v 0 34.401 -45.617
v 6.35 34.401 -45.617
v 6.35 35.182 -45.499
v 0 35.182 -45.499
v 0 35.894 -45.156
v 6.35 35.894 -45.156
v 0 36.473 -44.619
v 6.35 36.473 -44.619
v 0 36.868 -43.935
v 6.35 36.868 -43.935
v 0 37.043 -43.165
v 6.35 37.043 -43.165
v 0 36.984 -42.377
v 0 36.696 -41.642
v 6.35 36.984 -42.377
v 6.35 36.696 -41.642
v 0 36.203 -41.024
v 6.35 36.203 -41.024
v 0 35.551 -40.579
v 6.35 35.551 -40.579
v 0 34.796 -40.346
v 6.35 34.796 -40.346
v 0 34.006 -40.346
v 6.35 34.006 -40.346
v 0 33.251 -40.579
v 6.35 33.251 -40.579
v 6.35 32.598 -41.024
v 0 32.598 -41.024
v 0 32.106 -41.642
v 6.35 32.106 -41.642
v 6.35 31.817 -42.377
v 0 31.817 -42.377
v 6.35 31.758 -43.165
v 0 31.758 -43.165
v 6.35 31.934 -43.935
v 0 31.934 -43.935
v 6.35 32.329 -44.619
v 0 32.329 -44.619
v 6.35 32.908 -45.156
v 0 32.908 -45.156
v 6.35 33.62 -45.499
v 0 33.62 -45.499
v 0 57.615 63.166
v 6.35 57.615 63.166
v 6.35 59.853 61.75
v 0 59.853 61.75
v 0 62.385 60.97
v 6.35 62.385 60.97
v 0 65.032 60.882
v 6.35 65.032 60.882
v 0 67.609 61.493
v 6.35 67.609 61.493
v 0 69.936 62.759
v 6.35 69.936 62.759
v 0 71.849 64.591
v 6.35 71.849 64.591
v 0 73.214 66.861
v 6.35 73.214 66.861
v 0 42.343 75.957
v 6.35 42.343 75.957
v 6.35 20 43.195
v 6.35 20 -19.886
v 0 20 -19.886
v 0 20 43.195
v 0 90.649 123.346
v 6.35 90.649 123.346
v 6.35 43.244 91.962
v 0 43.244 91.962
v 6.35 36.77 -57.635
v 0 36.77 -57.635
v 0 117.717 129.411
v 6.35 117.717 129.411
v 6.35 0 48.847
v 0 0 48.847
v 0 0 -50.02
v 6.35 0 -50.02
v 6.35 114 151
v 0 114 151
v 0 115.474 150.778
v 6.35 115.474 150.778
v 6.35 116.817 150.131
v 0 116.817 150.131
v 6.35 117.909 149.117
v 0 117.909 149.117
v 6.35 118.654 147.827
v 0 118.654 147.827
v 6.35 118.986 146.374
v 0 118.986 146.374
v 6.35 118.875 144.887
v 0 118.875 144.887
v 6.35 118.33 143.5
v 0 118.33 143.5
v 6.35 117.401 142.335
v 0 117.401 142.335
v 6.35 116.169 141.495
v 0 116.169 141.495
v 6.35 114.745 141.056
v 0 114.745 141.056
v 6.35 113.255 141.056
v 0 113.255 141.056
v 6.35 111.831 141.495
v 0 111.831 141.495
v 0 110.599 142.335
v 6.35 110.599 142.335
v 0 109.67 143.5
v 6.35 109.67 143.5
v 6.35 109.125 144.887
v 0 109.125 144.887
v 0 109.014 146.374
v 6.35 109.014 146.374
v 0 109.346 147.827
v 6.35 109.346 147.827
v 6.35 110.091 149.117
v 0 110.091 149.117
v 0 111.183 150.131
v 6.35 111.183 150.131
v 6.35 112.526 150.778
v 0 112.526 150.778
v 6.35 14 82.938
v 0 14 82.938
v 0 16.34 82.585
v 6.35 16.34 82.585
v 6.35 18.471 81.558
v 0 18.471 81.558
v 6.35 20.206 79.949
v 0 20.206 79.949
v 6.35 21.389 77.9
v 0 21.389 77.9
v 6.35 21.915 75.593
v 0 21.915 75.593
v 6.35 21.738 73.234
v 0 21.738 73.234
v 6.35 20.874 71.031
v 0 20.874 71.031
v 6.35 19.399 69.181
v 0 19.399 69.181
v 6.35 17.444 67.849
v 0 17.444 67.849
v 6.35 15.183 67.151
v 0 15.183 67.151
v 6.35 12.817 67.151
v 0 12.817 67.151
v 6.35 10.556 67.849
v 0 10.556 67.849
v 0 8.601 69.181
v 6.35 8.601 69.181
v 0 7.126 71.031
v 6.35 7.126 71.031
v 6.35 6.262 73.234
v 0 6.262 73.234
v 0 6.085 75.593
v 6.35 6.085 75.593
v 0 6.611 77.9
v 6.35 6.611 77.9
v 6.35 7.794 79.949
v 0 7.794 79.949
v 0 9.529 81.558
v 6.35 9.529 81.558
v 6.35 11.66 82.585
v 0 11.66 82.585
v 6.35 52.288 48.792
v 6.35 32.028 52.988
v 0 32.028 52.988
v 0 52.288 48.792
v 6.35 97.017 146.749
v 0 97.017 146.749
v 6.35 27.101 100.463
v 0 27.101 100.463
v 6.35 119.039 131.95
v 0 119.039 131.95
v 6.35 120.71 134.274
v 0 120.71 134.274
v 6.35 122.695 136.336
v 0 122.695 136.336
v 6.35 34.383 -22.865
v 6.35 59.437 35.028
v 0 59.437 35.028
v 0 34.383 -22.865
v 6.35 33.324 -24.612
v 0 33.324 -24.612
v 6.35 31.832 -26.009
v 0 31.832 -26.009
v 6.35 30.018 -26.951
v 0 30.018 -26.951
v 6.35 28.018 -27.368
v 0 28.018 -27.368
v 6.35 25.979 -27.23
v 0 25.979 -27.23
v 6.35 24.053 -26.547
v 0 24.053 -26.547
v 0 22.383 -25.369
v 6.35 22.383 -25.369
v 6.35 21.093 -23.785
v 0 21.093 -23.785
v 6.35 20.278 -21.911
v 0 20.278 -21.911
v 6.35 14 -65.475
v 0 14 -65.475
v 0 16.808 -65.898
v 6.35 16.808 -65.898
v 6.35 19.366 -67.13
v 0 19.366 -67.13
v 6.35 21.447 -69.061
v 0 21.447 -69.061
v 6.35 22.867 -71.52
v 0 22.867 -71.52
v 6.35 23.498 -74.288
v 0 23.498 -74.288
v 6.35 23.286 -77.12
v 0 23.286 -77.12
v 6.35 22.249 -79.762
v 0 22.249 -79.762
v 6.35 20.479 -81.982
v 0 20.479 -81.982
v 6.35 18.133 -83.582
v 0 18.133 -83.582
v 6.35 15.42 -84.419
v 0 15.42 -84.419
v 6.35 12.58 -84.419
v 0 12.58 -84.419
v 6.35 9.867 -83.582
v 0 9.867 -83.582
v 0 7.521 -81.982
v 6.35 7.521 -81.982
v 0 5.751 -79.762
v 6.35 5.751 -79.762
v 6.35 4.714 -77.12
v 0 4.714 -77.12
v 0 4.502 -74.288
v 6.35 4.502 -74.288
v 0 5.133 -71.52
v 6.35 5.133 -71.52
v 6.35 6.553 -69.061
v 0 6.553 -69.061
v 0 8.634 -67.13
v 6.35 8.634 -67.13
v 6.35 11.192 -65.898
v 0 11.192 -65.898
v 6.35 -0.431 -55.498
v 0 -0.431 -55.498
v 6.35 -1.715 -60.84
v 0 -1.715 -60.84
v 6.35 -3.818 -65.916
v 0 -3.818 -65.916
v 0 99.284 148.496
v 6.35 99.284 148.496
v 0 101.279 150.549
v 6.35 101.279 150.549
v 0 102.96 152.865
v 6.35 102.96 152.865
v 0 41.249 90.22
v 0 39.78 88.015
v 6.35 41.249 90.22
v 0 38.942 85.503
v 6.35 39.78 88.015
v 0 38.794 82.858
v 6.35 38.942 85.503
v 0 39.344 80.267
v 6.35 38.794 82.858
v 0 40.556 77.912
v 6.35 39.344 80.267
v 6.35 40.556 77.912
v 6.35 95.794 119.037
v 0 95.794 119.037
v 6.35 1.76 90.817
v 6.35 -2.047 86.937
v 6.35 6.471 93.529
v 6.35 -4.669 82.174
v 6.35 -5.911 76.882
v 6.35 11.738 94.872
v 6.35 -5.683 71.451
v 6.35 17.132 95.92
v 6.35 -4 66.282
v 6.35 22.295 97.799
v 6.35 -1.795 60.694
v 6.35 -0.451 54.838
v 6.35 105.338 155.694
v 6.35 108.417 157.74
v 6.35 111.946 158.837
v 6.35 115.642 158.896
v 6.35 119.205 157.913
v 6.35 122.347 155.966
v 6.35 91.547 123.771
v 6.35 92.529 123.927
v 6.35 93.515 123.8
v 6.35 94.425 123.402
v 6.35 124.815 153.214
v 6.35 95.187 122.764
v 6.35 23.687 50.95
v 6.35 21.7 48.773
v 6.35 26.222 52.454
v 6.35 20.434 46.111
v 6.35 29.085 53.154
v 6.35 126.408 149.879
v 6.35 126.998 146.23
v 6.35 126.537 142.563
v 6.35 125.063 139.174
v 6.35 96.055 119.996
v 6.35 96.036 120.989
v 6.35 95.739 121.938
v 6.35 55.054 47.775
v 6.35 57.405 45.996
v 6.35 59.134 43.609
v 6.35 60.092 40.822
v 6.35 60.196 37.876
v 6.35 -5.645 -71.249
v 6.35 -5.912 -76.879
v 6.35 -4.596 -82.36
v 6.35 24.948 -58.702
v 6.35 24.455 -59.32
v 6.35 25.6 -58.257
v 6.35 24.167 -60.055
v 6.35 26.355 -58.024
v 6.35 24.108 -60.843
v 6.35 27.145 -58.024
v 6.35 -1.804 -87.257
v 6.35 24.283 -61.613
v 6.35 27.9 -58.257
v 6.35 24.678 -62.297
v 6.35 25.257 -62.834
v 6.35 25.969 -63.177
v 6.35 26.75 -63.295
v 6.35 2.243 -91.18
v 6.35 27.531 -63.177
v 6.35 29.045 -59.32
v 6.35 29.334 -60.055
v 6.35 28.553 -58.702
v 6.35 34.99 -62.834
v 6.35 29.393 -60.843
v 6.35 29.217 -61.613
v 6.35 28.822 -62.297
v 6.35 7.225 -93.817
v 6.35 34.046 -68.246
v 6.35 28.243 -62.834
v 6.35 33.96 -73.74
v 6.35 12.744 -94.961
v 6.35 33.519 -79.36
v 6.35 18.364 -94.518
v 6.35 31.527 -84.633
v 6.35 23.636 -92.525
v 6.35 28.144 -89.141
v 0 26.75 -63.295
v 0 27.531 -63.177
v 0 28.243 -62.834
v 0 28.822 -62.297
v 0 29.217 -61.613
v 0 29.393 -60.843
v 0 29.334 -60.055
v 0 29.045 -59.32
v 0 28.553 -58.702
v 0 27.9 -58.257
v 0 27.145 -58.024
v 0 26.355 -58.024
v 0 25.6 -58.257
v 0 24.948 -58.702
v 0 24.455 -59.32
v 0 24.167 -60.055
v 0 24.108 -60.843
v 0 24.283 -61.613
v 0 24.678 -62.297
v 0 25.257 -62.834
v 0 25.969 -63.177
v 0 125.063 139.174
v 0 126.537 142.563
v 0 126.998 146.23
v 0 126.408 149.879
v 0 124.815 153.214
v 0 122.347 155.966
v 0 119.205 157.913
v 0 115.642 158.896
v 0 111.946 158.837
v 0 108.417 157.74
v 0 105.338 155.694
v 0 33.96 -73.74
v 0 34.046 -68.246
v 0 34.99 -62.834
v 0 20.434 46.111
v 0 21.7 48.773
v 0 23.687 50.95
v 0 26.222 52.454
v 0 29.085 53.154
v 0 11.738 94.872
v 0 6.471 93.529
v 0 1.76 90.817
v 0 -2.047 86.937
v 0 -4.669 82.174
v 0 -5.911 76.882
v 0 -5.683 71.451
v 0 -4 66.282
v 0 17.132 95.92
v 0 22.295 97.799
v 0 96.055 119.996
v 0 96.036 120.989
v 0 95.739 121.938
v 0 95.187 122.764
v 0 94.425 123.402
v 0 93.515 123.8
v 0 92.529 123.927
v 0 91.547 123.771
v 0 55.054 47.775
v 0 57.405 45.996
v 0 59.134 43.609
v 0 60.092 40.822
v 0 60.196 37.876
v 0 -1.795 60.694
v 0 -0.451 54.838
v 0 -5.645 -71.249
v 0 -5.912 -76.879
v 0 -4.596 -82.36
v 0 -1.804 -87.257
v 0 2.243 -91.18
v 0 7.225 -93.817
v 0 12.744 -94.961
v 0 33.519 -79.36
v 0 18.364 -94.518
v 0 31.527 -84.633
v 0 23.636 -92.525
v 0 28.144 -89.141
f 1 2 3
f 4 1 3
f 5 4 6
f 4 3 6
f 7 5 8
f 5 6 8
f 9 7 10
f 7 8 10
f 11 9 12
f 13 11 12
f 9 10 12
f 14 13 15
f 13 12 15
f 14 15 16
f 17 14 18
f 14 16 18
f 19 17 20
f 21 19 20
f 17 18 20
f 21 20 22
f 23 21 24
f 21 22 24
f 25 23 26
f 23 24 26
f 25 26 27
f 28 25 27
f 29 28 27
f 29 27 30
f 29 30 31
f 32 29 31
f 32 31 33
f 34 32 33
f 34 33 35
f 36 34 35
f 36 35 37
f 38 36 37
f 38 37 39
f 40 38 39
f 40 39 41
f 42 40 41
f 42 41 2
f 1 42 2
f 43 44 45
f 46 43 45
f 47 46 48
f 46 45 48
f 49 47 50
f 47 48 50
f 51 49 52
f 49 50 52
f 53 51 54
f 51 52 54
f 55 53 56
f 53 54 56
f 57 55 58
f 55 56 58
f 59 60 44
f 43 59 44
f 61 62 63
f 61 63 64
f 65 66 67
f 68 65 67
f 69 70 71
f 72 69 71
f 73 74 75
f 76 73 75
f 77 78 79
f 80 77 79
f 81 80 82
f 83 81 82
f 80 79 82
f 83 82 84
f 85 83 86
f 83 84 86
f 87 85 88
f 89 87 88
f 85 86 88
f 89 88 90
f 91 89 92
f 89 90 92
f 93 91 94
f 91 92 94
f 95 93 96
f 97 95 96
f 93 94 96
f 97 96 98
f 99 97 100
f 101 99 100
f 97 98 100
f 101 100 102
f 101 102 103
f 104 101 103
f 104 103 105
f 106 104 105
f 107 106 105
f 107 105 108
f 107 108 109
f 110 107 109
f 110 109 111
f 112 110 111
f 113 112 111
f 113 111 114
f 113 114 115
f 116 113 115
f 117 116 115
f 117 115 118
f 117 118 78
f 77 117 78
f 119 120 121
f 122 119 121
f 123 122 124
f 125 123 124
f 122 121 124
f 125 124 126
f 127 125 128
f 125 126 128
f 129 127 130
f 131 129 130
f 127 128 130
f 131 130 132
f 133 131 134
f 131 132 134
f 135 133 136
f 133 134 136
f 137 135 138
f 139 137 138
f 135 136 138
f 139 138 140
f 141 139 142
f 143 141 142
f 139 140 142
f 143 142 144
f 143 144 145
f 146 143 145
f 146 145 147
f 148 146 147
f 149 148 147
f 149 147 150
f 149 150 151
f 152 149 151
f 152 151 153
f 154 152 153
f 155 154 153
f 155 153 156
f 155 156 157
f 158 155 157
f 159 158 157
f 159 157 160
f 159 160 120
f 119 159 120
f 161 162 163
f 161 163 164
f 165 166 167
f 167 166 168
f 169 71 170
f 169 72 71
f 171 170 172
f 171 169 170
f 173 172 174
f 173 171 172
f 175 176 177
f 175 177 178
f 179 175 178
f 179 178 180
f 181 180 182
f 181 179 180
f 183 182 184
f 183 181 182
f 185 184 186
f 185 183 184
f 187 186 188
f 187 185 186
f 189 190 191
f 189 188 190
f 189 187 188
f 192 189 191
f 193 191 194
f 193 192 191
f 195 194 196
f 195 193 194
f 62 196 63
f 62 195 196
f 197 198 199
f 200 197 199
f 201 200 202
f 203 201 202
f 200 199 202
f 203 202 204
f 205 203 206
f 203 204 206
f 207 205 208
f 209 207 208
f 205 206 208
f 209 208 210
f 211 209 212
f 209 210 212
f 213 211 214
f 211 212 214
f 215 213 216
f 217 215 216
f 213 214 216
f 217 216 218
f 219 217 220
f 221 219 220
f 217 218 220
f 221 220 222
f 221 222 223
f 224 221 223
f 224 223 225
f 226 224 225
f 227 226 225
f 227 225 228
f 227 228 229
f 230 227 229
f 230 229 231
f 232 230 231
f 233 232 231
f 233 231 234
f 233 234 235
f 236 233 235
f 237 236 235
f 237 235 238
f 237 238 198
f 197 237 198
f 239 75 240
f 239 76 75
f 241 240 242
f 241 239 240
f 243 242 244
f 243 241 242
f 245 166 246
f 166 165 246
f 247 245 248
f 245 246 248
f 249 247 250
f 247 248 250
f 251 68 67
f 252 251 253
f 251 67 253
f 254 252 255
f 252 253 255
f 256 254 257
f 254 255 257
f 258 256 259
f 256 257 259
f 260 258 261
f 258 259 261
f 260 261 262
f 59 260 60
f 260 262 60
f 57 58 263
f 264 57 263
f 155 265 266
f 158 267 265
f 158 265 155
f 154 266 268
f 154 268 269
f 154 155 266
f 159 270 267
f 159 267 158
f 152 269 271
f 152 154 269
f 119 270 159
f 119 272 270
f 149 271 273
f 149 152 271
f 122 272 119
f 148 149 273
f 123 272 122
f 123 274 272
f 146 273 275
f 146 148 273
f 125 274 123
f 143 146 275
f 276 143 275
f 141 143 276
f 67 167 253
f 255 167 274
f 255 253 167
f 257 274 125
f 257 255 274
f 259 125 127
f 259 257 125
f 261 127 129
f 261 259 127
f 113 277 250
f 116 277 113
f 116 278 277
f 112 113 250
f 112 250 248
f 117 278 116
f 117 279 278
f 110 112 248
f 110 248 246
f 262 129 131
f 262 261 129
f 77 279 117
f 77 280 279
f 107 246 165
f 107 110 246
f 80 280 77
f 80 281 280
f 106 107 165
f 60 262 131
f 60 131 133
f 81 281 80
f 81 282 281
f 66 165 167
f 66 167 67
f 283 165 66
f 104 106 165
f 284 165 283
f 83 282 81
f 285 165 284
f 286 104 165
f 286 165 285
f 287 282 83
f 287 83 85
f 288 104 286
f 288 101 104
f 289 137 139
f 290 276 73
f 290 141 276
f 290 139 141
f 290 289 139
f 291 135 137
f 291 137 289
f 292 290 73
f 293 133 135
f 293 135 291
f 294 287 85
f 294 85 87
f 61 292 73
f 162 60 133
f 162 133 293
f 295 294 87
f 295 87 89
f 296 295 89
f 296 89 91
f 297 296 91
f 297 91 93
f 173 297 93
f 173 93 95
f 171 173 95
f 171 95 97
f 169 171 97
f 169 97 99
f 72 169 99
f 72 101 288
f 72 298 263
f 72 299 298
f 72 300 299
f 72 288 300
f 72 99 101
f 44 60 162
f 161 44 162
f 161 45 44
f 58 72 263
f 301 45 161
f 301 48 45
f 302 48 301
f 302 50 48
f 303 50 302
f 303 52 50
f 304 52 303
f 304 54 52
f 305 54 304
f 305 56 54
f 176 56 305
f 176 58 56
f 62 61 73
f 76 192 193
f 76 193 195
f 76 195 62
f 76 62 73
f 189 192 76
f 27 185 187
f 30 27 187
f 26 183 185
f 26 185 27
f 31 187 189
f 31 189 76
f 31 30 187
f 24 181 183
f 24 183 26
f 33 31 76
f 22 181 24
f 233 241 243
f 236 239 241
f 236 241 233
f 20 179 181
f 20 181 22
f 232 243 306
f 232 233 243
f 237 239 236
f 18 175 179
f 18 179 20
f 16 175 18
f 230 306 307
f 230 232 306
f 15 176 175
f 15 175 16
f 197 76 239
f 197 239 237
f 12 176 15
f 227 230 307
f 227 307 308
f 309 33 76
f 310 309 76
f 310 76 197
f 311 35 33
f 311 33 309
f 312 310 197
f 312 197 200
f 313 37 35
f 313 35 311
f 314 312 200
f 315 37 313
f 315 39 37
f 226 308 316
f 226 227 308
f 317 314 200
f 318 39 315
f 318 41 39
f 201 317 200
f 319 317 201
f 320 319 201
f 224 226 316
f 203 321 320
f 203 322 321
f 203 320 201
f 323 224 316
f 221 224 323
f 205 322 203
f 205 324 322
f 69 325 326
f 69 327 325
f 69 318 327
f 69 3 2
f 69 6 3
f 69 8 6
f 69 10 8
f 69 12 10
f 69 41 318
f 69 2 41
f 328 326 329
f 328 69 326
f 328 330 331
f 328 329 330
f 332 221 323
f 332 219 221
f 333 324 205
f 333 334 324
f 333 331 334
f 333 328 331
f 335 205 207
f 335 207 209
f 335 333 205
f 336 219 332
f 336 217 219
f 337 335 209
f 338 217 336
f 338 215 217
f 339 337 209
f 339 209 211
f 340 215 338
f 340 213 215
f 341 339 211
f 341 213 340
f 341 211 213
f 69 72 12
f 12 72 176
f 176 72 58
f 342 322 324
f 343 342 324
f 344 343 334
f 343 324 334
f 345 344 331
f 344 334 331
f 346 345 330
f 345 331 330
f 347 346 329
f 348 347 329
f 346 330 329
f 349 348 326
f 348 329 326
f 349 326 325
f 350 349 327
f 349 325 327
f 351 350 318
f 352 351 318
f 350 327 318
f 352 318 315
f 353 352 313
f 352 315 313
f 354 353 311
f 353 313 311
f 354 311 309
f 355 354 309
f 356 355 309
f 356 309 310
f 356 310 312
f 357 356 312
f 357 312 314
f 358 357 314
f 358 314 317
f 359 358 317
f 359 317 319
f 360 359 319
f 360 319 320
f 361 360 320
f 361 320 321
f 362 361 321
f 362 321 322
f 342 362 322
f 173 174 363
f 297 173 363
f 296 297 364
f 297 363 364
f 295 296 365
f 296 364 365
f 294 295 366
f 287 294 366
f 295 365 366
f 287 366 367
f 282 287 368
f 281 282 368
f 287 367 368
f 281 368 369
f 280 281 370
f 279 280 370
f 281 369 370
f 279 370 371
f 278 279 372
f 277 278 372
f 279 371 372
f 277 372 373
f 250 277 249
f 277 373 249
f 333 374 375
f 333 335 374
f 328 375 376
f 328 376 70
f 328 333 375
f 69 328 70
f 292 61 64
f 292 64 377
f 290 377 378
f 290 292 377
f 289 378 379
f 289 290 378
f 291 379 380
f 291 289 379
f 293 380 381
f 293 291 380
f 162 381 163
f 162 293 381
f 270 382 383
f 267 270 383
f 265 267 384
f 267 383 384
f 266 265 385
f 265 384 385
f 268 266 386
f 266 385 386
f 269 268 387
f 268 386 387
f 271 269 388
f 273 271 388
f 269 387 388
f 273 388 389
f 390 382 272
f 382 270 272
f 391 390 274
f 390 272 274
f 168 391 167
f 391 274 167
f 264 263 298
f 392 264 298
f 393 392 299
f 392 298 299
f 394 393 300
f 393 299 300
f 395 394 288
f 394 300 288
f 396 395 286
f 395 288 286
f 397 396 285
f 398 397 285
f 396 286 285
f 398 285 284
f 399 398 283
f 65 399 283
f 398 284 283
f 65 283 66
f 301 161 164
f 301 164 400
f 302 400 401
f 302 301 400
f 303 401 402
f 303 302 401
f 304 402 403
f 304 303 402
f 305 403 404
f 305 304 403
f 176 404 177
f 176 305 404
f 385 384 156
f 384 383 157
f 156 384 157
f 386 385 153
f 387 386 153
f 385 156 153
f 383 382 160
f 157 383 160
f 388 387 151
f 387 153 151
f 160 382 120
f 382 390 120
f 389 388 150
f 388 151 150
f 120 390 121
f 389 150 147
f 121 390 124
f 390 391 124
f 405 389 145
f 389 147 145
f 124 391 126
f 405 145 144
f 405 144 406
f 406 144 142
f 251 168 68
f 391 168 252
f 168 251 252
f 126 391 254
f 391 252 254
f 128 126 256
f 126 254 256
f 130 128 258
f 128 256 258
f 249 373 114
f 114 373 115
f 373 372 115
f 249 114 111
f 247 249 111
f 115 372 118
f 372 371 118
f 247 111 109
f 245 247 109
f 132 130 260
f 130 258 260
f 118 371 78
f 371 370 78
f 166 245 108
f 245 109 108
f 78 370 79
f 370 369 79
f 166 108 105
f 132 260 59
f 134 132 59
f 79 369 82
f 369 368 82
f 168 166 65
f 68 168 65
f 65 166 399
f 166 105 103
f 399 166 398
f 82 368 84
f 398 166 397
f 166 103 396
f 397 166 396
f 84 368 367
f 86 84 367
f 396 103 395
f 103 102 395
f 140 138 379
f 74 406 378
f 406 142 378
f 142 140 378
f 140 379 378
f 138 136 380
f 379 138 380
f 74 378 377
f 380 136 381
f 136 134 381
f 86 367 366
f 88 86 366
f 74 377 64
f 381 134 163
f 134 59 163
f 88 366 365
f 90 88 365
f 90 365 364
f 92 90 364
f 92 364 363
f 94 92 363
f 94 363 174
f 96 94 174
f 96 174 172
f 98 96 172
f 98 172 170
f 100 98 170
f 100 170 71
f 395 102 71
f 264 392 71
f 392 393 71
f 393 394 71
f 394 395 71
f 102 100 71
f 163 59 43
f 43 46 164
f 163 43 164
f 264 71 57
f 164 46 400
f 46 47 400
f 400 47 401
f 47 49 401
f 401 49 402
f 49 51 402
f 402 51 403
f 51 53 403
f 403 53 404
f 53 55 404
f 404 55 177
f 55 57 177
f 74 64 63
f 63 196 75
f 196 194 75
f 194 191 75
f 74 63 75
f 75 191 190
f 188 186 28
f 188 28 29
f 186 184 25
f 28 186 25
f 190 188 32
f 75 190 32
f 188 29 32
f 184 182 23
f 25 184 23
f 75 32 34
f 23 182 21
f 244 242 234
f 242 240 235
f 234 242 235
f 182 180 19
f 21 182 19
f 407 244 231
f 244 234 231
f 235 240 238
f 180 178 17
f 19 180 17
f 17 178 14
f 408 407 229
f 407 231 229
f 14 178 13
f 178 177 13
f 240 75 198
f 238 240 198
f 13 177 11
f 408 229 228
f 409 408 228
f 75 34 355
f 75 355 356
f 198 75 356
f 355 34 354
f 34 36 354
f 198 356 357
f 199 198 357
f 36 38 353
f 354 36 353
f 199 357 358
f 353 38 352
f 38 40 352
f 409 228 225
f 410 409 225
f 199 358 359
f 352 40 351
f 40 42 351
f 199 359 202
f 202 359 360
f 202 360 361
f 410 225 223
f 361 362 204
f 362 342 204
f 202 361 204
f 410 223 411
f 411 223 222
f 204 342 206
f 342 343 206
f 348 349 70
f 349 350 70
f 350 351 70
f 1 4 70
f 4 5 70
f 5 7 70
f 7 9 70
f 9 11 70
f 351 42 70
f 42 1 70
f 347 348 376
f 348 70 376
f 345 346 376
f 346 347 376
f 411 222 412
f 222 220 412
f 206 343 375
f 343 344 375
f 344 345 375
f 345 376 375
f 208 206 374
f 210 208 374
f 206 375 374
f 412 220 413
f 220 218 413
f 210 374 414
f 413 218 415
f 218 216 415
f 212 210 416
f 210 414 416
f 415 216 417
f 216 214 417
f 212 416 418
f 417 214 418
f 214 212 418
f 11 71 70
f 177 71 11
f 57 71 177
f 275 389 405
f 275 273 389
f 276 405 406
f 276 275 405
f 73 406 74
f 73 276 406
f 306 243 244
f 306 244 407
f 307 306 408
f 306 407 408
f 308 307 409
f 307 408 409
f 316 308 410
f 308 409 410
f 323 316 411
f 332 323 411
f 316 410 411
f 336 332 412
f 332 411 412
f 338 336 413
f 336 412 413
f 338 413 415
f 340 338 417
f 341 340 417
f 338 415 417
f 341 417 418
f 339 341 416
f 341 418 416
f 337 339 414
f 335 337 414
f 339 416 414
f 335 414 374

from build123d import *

# Parameters (mm, degrees)
BOSS_EXTRUDE1_DEPTH         = 6.35
F_3_4_0_75_DIAMETER_HOLE1_D = 19.05
F_10_0_10_DIAMETER_HOLE1_D  = 10
F_5_8_DIAMETER_HOLE2_D      = 15.875
CUT_EXTRUDE1_REACH          = 205.594
FILLET1_R                   = 35
FILLET3_R                   = 35
FILLET4_R                   = 20
FILLET6_R                   = 40
SKETCH22_R                  = 2.65
CUT_EXTRUDE2_DEPTH          = 10
SKETCH24_R                  = 2.65
CUT_EXTRUDE3_DEPTH          = 10


with BuildPart() as part:
    # Sketch1 → Boss-Extrude1 (new body)
    with BuildSketch(Plane(origin=(0, 0, 0), x_dir=(0, 0, -1), z_dir=(1, 0, 0))):
        with BuildLine():
            Line((-60.717143143, 0), (60.717143143, 0))
            ThreePointArc((60.717143143, 0), (94.584407895, 9.944020783), (67.452353804, 32.521151068))
            Line((67.452353804, 32.521151068), (-134.404938559, 119.878311848))
            ThreePointArc((-134.404938559, 119.878311848), (-155.966181949, 122.347168224), (-149.752887031, 101.553480851))
            Line((-149.752887031, 101.553480851), (-94.55805454, 18.181208272))
            ThreePointArc((-94.55805454, 18.181208272), (-84.465516954, -3.618285637), (-60.717143143, 0))
        make_face()
    extrude(amount=BOSS_EXTRUDE1_DEPTH)

    # 3/4 (0.75) Diameter Hole1 (through all)
    with Locations(Plane(origin=(6.35, 0, 0), x_dir=(0, 0, -1), z_dir=(1, 0, 0))):
        with Locations((75, 14)):
            Hole(F_3_4_0_75_DIAMETER_HOLE1_D / 2)

    # Ø10.0 (10) Diameter Hole1 (through all)
    with Locations(Plane(origin=(6.35, 0, 0), x_dir=(0, 0, -1), z_dir=(1, 0, 0))):
        with Locations((-146, 114)):
            Hole(F_10_0_10_DIAMETER_HOLE1_D / 2)

    # Ø5/8" Diameter Hole2 (through all)
    with Locations(Plane(origin=(6.35, 0, 0), x_dir=(0, 0, -1), z_dir=(1, 0, 0))):
        with Locations((-75, 14)):
            Hole(F_5_8_DIAMETER_HOLE2_D / 2)

    # Sketch8 → Cut-Extrude1 (cut, up to next)
    with BuildSketch(Plane(origin=(6.35, 0, 0), x_dir=(0, 0, -1), z_dir=(1, 0, 0)), mode=Mode.PRIVATE) as cut_extrude1_sk1:
        with BuildLine():
            Line((-52.98768213, 32.027989609), (-48.791838571, 52.287736349))
            ThreePointArc((-48.791838571, 52.287736349), (-43.609219792, 59.133963583), (-35.027937054, 59.43719837))
            Line((-35.027937054, 59.43719837), (22.864909862, 34.383088722))
            ThreePointArc((22.864909862, 34.383088722), (27.230289645, 25.979007794), (19.886136685, 20))
            Line((19.886136685, 20), (-43.195478183, 20))
            ThreePointArc((-43.195478183, 20), (-50.950473221, 23.686518238), (-52.98768213, 32.027989609))
        make_face()
    cut_extrude1_tool1 = extrude(cut_extrude1_sk1.sketch, amount=-CUT_EXTRUDE1_REACH, mode=Mode.PRIVATE) & part.part
    # Sketch8 → Cut-Extrude1 (cut, up to next)
    with BuildSketch(Plane(origin=(6.35, 0, 0), x_dir=(0, 0, -1), z_dir=(1, 0, 0)), mode=Mode.PRIVATE) as cut_extrude1_sk2:
        with BuildLine():
            Line((-75.95726339, 42.34340423), (-63.166421785, 57.61515284))
            ThreePointArc((-63.166421785, 57.61515284), (-61.101947711, 66.340863059), (-66.861018022, 73.213503103))
            Line((-66.861018022, 73.213503103), (-119.037006728, 95.793545572))
            ThreePointArc((-119.037006728, 95.793545572), (-123.11030371, 94.828752024), (-123.345509052, 90.649367698))
            Line((-123.345509052, 90.649367698), (-91.961866267, 43.244103424))
            ThreePointArc((-91.961866267, 43.244103424), (-84.185443207, 38.780101137), (-75.95726339, 42.34340423))
        make_face()
    cut_extrude1_tool2 = extrude(cut_extrude1_sk2.sketch, amount=-CUT_EXTRUDE1_REACH, mode=Mode.PRIVATE) & part.part
    add(cut_extrude1_tool1.solids().sort_by_distance((6.35, 35.497015, 18.727672))[0], mode=Mode.SUBTRACT)
    add(cut_extrude1_tool2.solids().sort_by_distance((6.35, 67.079595, 89.97893))[0], mode=Mode.SUBTRACT)

    # Fillet1
    fillet1_edges = [part.edges().sort_by_distance(p)[0] for p in [
        (3.175, 18.181208272, 94.55805454),
    ]]
    fillet(fillet1_edges, radius=FILLET1_R)

    # Fillet3
    fillet3_edges = [part.edges().sort_by_distance(p)[0] for p in [
        (3.175, 32.521151068, -67.452353804),
        (3.175, 0, -60.717143143),
    ]]
    fillet(fillet3_edges, radius=FILLET3_R)

    # Fillet4
    fillet4_edges = [part.edges().sort_by_distance(p)[0] for p in [
        (3.175, 101.553480851, 149.752887031),
        (3.175, 119.878311848, 134.404938559),
    ]]
    fillet(fillet4_edges, radius=FILLET4_R)

    # Fillet6
    fillet6_edges = [part.edges().sort_by_distance(p)[0] for p in [
        (3.175, 0, 60.717143143),
    ]]
    fillet(fillet6_edges, radius=FILLET6_R)

    # Sketch22 → Cut-Extrude2 (cut)
    with BuildSketch(Plane(origin=(6.35, 0, 0), x_dir=(0, 0, -1), z_dir=(1, 0, 0))):
        with Locations((60.644779113, 26.750227475)):
            Circle(SKETCH22_R)
    extrude(amount=-CUT_EXTRUDE2_DEPTH, mode=Mode.SUBTRACT)

    # Sketch24 → Cut-Extrude3 (cut)
    with BuildSketch(Plane(origin=(6.35, 0, 0), x_dir=(0, 0, -1), z_dir=(1, 0, 0))):
        with Locations((42.966527297, 34.400790246)):
            Circle(SKETCH24_R)
    extrude(amount=-CUT_EXTRUDE3_DEPTH, mode=Mode.SUBTRACT)


solid = part.part
